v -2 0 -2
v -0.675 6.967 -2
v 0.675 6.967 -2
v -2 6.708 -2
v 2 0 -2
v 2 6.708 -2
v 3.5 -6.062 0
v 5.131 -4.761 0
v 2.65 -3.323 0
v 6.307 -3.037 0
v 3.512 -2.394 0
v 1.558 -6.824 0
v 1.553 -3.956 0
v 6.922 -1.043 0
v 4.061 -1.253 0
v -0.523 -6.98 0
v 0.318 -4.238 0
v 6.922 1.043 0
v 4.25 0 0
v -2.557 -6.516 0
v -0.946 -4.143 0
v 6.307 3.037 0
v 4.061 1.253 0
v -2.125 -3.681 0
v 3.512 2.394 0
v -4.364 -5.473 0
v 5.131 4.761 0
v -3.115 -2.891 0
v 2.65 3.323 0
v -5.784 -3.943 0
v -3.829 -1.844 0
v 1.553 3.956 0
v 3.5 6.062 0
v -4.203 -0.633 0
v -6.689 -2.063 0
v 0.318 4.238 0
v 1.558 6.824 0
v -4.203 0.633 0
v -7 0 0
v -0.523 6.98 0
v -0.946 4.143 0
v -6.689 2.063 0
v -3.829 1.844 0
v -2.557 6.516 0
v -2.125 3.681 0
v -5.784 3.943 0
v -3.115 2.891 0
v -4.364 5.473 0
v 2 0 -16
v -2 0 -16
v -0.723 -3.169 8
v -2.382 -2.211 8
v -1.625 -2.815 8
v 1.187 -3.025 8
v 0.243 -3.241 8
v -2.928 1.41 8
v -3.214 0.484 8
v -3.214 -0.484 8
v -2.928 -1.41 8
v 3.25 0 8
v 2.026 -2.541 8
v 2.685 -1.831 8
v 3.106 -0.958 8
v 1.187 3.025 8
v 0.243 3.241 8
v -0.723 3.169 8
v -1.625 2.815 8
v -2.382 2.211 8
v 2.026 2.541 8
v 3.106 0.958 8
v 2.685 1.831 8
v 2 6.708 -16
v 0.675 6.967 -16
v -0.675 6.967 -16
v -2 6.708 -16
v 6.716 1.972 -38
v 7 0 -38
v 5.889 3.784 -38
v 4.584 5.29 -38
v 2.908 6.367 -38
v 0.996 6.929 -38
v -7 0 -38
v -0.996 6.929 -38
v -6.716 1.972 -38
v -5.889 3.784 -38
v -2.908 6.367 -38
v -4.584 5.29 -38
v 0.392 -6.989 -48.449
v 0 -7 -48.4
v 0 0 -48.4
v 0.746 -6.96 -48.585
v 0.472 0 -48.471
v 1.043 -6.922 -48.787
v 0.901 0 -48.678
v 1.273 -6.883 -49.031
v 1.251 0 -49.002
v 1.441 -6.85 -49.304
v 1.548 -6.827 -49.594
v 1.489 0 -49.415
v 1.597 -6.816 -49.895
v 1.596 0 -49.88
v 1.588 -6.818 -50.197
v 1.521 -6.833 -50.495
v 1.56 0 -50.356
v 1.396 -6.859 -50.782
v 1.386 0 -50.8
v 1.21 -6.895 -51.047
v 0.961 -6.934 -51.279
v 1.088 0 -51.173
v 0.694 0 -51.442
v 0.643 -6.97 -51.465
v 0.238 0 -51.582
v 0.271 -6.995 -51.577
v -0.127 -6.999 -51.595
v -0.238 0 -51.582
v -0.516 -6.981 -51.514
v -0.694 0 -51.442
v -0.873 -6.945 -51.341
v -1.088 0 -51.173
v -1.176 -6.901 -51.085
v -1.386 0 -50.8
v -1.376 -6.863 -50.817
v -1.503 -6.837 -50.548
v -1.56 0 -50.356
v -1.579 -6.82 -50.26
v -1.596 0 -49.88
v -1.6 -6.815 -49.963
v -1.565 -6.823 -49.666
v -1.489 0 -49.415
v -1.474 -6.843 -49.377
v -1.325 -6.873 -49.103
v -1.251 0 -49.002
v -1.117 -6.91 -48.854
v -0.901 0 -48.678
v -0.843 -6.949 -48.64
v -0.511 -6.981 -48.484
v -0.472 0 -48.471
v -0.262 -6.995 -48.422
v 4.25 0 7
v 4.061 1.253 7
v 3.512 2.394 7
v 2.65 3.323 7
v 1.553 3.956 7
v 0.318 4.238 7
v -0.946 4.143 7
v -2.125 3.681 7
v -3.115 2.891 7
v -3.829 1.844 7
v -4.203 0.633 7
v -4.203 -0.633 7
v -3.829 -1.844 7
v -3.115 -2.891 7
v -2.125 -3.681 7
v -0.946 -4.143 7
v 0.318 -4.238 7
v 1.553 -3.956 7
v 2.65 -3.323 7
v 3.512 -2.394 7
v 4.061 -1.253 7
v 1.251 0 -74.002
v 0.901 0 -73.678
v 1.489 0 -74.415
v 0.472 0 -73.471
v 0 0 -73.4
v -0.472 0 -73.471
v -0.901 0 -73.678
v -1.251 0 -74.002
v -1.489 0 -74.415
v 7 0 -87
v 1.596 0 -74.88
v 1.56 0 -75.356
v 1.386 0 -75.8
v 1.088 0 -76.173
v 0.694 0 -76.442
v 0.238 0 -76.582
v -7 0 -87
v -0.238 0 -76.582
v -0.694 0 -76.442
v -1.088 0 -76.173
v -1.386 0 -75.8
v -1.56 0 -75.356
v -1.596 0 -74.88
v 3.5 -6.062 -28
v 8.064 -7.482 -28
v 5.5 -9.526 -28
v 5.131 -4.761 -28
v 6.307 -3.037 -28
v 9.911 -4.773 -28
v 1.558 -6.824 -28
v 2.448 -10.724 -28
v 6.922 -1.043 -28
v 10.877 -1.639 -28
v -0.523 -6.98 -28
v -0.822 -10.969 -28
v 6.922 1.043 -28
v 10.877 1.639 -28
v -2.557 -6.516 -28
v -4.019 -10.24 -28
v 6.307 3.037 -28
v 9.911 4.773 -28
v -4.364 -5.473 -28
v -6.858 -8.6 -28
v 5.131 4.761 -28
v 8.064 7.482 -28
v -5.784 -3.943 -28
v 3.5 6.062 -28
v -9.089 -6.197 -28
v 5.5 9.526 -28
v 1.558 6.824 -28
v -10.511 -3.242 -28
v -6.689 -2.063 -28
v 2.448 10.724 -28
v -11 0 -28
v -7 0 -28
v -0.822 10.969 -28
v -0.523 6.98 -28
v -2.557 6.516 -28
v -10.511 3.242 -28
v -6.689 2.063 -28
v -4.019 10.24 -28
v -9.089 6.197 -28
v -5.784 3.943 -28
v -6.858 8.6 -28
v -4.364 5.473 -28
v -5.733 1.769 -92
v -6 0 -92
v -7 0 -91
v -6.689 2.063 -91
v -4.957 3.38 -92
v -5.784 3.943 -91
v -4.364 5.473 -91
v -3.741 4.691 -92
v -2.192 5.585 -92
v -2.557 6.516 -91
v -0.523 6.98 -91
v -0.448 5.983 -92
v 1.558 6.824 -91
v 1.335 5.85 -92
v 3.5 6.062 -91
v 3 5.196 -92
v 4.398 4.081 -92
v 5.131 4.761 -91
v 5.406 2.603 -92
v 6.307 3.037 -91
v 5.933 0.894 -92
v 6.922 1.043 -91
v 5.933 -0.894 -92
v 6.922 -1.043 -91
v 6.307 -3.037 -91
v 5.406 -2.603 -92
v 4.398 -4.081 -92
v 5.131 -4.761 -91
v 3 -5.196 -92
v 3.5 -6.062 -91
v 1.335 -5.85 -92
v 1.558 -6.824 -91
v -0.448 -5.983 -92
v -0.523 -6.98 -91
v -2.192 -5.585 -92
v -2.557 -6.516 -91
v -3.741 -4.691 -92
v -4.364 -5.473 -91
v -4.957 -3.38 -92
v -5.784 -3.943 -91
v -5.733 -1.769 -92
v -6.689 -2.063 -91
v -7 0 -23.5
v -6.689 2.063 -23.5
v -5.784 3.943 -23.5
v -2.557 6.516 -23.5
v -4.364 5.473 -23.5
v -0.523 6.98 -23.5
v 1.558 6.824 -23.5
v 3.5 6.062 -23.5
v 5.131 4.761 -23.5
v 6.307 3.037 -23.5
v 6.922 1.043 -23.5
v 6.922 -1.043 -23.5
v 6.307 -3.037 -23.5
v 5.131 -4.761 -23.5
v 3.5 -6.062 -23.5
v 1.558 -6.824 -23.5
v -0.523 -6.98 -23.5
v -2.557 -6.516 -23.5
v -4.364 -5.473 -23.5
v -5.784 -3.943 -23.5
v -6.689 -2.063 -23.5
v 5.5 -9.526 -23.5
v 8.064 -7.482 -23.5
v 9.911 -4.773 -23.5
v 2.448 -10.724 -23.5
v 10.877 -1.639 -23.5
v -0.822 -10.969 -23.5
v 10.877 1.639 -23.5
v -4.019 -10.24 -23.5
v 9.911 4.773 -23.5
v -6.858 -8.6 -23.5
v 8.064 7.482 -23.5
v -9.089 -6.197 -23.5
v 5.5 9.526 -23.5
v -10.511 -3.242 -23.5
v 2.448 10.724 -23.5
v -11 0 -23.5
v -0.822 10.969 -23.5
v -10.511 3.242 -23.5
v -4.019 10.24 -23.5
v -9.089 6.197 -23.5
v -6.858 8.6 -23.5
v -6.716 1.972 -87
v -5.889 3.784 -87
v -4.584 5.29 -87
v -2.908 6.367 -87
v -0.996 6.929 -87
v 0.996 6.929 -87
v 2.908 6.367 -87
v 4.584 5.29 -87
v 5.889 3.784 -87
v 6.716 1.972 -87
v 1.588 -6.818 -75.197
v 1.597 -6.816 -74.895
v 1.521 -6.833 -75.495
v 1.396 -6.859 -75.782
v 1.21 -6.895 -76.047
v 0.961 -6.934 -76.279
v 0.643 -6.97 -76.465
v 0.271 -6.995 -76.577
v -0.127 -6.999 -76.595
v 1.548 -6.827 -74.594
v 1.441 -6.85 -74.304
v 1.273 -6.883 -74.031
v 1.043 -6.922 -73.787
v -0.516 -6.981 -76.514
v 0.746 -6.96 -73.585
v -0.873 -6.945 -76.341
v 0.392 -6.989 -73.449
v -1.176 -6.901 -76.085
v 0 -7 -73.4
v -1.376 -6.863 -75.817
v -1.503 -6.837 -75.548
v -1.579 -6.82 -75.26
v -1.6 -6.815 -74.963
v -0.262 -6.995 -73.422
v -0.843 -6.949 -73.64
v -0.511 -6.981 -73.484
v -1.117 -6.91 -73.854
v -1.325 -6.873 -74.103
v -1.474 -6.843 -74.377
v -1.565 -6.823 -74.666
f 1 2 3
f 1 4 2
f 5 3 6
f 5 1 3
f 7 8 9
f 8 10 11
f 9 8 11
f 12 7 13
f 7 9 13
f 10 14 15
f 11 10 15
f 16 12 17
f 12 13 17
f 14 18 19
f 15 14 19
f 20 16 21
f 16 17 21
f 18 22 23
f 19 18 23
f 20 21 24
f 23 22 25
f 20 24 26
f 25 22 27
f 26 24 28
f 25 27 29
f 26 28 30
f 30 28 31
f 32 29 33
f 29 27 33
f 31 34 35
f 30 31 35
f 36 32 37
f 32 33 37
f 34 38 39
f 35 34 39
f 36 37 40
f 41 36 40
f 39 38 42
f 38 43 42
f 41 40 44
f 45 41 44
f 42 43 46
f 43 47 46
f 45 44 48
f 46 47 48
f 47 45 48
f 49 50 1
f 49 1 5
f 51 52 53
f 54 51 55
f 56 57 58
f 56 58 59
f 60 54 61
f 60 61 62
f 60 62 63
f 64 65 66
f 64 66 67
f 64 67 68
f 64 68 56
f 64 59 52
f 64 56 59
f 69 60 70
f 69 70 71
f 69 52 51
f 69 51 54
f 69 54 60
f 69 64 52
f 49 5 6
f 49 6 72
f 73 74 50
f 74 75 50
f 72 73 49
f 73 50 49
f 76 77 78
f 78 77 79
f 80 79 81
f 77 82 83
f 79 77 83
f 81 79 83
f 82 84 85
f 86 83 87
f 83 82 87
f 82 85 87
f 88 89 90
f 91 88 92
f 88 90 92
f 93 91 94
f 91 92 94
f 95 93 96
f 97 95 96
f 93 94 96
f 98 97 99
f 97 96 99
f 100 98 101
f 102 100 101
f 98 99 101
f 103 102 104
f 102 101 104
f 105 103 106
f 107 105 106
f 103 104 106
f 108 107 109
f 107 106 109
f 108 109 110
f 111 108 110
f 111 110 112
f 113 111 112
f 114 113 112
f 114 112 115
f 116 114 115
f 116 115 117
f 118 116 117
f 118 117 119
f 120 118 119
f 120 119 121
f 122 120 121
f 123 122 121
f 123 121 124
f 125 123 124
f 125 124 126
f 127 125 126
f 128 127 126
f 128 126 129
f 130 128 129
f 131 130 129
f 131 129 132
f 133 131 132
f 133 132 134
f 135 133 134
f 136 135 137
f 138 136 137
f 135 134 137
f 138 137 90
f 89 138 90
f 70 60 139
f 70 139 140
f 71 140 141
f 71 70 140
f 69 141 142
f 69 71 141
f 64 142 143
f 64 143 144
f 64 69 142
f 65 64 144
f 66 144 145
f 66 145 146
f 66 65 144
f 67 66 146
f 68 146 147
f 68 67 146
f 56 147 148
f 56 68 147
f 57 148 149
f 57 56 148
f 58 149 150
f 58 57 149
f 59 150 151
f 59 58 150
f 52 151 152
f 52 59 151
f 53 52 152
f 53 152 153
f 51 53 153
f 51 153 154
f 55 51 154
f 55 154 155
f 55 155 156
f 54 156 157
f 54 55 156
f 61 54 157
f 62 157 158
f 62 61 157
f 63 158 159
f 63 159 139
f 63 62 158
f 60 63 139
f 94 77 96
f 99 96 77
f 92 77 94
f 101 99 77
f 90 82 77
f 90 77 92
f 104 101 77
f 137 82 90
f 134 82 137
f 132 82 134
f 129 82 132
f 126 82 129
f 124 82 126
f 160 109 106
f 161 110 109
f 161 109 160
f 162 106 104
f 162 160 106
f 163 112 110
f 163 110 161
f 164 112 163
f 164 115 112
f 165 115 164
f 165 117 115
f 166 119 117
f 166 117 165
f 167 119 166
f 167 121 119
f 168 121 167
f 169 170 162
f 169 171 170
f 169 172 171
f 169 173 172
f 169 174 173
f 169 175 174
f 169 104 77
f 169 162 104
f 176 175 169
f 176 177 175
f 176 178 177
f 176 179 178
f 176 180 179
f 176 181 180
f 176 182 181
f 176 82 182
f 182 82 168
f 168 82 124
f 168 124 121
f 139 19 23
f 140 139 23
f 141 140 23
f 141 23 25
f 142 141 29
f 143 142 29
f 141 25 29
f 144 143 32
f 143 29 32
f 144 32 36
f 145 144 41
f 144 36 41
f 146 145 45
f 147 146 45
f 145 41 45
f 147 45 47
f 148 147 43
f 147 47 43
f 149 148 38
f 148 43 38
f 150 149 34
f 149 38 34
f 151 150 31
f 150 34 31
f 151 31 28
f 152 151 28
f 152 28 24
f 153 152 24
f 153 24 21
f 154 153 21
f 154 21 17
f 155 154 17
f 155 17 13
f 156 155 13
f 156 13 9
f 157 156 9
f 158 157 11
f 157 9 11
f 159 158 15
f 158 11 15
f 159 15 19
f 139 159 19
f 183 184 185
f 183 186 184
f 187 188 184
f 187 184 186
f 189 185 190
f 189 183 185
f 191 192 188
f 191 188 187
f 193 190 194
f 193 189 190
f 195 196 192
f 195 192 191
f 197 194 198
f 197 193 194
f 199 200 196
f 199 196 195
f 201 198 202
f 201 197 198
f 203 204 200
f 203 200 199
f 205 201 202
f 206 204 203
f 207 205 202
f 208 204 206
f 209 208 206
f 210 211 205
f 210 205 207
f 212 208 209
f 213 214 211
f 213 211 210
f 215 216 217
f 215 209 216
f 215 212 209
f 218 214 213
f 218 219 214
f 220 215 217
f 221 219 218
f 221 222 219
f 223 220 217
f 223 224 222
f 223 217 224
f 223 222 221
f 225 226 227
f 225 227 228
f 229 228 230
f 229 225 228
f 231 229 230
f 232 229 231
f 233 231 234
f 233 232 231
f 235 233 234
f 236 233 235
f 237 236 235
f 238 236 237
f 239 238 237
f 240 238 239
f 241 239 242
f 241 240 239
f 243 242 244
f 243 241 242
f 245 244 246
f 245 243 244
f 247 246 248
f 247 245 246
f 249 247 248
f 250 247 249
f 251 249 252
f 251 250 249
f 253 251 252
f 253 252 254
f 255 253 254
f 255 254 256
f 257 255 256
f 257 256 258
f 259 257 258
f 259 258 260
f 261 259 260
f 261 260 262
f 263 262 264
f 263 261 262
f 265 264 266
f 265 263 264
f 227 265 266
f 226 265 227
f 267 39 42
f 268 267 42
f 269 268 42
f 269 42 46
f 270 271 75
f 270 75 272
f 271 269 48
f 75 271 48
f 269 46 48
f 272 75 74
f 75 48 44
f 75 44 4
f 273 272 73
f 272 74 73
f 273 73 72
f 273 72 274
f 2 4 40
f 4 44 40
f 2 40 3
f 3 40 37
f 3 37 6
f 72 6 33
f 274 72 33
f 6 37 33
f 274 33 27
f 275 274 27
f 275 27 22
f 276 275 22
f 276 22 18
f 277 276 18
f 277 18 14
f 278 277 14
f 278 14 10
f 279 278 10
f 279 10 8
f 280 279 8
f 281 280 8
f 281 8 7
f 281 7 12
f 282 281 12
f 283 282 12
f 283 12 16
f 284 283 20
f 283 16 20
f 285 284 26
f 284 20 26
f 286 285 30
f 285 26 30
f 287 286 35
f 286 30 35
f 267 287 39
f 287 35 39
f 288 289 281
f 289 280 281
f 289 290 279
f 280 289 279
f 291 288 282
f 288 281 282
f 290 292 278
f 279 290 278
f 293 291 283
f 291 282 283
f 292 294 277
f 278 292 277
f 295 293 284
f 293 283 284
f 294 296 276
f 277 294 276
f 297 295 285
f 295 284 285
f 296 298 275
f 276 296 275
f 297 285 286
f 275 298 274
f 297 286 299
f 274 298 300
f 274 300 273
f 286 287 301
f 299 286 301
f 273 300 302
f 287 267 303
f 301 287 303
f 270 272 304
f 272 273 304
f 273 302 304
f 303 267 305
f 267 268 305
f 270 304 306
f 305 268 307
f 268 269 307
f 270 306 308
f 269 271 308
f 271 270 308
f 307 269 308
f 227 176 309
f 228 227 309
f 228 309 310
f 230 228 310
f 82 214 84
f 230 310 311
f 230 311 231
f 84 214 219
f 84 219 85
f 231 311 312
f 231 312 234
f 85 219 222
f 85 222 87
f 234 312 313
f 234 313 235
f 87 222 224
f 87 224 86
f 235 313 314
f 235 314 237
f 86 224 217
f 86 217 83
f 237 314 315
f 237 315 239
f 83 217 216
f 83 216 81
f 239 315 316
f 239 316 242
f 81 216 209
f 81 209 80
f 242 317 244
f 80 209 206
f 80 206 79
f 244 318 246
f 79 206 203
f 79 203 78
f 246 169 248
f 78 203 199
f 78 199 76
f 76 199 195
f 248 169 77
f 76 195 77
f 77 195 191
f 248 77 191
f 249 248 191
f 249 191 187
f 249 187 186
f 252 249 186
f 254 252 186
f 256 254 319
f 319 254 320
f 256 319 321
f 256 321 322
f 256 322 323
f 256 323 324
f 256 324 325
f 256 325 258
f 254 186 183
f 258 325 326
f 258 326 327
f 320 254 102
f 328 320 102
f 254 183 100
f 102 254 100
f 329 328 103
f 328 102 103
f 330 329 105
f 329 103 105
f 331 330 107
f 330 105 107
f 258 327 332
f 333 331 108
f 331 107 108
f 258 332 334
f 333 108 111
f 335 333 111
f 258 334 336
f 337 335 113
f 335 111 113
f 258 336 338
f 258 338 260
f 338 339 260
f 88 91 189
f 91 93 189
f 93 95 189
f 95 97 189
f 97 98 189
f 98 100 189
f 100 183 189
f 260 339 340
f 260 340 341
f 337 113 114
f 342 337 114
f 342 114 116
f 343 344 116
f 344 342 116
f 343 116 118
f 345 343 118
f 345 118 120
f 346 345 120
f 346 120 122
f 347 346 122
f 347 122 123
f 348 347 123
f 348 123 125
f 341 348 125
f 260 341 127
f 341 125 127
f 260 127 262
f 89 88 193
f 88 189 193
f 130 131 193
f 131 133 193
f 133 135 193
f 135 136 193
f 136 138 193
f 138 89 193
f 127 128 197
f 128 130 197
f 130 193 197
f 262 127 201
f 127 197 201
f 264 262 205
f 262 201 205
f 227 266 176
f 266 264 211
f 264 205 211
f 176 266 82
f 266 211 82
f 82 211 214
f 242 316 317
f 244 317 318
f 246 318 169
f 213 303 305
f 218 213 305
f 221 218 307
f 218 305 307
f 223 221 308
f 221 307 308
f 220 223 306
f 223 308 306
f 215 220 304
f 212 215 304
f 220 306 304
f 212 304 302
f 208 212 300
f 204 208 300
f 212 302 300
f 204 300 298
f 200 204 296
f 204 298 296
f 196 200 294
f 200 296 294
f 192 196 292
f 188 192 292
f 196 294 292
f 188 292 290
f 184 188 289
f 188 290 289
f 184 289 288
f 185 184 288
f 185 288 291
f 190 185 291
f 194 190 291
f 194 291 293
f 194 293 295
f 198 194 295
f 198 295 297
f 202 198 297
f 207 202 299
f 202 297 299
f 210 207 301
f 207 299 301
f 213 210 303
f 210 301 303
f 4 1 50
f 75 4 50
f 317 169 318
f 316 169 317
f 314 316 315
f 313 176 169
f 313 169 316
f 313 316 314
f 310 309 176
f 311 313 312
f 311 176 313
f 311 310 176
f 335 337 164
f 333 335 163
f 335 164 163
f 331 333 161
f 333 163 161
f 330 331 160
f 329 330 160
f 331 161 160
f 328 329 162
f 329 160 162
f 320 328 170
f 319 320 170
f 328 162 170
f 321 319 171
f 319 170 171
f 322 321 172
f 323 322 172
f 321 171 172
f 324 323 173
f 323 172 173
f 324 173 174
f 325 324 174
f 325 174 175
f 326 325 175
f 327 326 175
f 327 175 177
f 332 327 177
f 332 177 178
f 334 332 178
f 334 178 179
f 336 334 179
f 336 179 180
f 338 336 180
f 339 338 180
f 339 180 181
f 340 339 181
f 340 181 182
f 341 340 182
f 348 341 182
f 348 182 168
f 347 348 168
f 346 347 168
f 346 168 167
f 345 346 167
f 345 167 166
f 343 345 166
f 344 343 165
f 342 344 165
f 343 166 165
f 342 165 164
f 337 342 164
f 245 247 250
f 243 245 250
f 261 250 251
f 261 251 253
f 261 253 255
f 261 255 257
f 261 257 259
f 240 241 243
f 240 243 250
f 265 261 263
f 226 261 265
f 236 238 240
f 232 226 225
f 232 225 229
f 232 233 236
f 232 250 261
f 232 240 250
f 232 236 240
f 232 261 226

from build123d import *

# Parameters (mm, degrees)
SKETCH1_R               = 4.25
BOSS_EXTRUDE1_DEPTH     = 8
CHAMFER1_SIZE           = 1
SKETCH2_R               = 7
BOSS_EXTRUDE2_DEPTH     = 23.5
SKETCH4_R               = 11
BOSS_EXTRUDE3_DEPTH     = 4.5
SKETCH5_R               = 7
BOSS_EXTRUDE4_DEPTH     = 64
CUT_EXTRUDE2_DEPTH      = 94.305948363
CUT_EXTRUDE2_DEPTH_BACK = 94.305948363
SKETCH6_W               = 49
SKETCH6_H               = 7
CUT_EXTRUDE3_REACH      = 95.306
CUT_EXTRUDE3_END_RADIUS = 7
SKETCH7_R               = 1.6
CHAMFER2_SIZE           = 1
SKETCH8_W               = 4
SKETCH8_H               = 14
CUT_EXTRUDE4_DEPTH      = 10


with BuildPart() as part:
    # Sketch1 → Boss-Extrude1 (new body)
    with BuildSketch(Plane.XY):
        Circle(SKETCH1_R)
    extrude(amount=BOSS_EXTRUDE1_DEPTH)

    # Chamfer1
    chamfer1_edges = [part.edges().sort_by_distance(p)[0] for p in [
        (-4.25, 0, 8),
    ]]
    chamfer(chamfer1_edges, length=CHAMFER1_SIZE)

    # Sketch2 → Boss-Extrude2 (add)
    with BuildSketch(Plane(origin=(0, 0, 0), x_dir=(-1, 0, 0), z_dir=(0, 0, -1))):
        Circle(SKETCH2_R)
    extrude(amount=BOSS_EXTRUDE2_DEPTH)

    # Sketch4 → Boss-Extrude3 (add)
    with BuildSketch(Plane(origin=(0, 0, -23.5), x_dir=(-1, 0, 0), z_dir=(0, 0, -1))):
        Circle(SKETCH4_R)
    extrude(amount=BOSS_EXTRUDE3_DEPTH)

    # Sketch5 → Boss-Extrude4 (add)
    with BuildSketch(Plane(origin=(0, 0, -28), x_dir=(-1, 0, 0), z_dir=(0, 0, -1))):
        Circle(SKETCH5_R)
    extrude(amount=BOSS_EXTRUDE4_DEPTH)

    # Sketch6 → Cut-Extrude2 (cut, two sides: drawn at the far end of the back side and taken through both)
    with BuildSketch(Plane(origin=(0, 0, 0), x_dir=(0, 0, -1), z_dir=(1, 0, 0)).offset(-CUT_EXTRUDE2_DEPTH_BACK)):
        with Locations((62.5, 3.5)):
            Rectangle(SKETCH6_W, SKETCH6_H)
    extrude(amount=CUT_EXTRUDE2_DEPTH + CUT_EXTRUDE2_DEPTH_BACK, mode=Mode.SUBTRACT)

    # Cut-Extrude3: up to this cylinder (the profile starts inside it)
    cut_extrude3_end = Plane(origin=(0, 0, -62.5), z_dir=(0, 0, 1)) * Cylinder(CUT_EXTRUDE3_END_RADIUS, 230.612, mode=Mode.PRIVATE)
    # Sketch7 → Cut-Extrude3 (cut, up to the surface)
    with BuildSketch(Plane(origin=(0, 0, 0), x_dir=(1, 0, 0), z_dir=(0, 1, 0)), mode=Mode.PRIVATE) as cut_extrude3_sk1:
        with Locations(Location((0, 75, 0), (0, 0, 270))):
            Circle(SKETCH7_R)
    cut_extrude3_tool1 = extrude(cut_extrude3_sk1.sketch, amount=-CUT_EXTRUDE3_REACH, mode=Mode.PRIVATE) & cut_extrude3_end
    add(cut_extrude3_tool1.solids().sort_by_distance((0, 0, -75))[0], mode=Mode.SUBTRACT)
    # Sketch7 → Cut-Extrude3 (cut, up to the surface)
    with BuildSketch(Plane(origin=(0, 0, 0), x_dir=(1, 0, 0), z_dir=(0, 1, 0)), mode=Mode.PRIVATE) as cut_extrude3_sk2:
        with Locations(Location((0, 50, 0), (0, 0, 270))):
            Circle(SKETCH7_R)
    cut_extrude3_tool2 = extrude(cut_extrude3_sk2.sketch, amount=-CUT_EXTRUDE3_REACH, mode=Mode.PRIVATE) & cut_extrude3_end
    add(cut_extrude3_tool2.solids().sort_by_distance((0, 0, -50))[0], mode=Mode.SUBTRACT)

    # Chamfer2
    chamfer2_edges = [part.edges().sort_by_distance(p)[0] for p in [
        (7, 0, -92),
    ]]
    chamfer(chamfer2_edges, length=CHAMFER2_SIZE)

    # Sketch8 → Cut-Extrude4 (cut)
    with BuildSketch(Plane(origin=(0, 0, 0), x_dir=(1, 0, 0), z_dir=(0, 1, 0))):
        with Locations((0, 9)):
            Rectangle(SKETCH8_W, SKETCH8_H)
    extrude(amount=CUT_EXTRUDE4_DEPTH, mode=Mode.SUBTRACT)


solid = part.part
